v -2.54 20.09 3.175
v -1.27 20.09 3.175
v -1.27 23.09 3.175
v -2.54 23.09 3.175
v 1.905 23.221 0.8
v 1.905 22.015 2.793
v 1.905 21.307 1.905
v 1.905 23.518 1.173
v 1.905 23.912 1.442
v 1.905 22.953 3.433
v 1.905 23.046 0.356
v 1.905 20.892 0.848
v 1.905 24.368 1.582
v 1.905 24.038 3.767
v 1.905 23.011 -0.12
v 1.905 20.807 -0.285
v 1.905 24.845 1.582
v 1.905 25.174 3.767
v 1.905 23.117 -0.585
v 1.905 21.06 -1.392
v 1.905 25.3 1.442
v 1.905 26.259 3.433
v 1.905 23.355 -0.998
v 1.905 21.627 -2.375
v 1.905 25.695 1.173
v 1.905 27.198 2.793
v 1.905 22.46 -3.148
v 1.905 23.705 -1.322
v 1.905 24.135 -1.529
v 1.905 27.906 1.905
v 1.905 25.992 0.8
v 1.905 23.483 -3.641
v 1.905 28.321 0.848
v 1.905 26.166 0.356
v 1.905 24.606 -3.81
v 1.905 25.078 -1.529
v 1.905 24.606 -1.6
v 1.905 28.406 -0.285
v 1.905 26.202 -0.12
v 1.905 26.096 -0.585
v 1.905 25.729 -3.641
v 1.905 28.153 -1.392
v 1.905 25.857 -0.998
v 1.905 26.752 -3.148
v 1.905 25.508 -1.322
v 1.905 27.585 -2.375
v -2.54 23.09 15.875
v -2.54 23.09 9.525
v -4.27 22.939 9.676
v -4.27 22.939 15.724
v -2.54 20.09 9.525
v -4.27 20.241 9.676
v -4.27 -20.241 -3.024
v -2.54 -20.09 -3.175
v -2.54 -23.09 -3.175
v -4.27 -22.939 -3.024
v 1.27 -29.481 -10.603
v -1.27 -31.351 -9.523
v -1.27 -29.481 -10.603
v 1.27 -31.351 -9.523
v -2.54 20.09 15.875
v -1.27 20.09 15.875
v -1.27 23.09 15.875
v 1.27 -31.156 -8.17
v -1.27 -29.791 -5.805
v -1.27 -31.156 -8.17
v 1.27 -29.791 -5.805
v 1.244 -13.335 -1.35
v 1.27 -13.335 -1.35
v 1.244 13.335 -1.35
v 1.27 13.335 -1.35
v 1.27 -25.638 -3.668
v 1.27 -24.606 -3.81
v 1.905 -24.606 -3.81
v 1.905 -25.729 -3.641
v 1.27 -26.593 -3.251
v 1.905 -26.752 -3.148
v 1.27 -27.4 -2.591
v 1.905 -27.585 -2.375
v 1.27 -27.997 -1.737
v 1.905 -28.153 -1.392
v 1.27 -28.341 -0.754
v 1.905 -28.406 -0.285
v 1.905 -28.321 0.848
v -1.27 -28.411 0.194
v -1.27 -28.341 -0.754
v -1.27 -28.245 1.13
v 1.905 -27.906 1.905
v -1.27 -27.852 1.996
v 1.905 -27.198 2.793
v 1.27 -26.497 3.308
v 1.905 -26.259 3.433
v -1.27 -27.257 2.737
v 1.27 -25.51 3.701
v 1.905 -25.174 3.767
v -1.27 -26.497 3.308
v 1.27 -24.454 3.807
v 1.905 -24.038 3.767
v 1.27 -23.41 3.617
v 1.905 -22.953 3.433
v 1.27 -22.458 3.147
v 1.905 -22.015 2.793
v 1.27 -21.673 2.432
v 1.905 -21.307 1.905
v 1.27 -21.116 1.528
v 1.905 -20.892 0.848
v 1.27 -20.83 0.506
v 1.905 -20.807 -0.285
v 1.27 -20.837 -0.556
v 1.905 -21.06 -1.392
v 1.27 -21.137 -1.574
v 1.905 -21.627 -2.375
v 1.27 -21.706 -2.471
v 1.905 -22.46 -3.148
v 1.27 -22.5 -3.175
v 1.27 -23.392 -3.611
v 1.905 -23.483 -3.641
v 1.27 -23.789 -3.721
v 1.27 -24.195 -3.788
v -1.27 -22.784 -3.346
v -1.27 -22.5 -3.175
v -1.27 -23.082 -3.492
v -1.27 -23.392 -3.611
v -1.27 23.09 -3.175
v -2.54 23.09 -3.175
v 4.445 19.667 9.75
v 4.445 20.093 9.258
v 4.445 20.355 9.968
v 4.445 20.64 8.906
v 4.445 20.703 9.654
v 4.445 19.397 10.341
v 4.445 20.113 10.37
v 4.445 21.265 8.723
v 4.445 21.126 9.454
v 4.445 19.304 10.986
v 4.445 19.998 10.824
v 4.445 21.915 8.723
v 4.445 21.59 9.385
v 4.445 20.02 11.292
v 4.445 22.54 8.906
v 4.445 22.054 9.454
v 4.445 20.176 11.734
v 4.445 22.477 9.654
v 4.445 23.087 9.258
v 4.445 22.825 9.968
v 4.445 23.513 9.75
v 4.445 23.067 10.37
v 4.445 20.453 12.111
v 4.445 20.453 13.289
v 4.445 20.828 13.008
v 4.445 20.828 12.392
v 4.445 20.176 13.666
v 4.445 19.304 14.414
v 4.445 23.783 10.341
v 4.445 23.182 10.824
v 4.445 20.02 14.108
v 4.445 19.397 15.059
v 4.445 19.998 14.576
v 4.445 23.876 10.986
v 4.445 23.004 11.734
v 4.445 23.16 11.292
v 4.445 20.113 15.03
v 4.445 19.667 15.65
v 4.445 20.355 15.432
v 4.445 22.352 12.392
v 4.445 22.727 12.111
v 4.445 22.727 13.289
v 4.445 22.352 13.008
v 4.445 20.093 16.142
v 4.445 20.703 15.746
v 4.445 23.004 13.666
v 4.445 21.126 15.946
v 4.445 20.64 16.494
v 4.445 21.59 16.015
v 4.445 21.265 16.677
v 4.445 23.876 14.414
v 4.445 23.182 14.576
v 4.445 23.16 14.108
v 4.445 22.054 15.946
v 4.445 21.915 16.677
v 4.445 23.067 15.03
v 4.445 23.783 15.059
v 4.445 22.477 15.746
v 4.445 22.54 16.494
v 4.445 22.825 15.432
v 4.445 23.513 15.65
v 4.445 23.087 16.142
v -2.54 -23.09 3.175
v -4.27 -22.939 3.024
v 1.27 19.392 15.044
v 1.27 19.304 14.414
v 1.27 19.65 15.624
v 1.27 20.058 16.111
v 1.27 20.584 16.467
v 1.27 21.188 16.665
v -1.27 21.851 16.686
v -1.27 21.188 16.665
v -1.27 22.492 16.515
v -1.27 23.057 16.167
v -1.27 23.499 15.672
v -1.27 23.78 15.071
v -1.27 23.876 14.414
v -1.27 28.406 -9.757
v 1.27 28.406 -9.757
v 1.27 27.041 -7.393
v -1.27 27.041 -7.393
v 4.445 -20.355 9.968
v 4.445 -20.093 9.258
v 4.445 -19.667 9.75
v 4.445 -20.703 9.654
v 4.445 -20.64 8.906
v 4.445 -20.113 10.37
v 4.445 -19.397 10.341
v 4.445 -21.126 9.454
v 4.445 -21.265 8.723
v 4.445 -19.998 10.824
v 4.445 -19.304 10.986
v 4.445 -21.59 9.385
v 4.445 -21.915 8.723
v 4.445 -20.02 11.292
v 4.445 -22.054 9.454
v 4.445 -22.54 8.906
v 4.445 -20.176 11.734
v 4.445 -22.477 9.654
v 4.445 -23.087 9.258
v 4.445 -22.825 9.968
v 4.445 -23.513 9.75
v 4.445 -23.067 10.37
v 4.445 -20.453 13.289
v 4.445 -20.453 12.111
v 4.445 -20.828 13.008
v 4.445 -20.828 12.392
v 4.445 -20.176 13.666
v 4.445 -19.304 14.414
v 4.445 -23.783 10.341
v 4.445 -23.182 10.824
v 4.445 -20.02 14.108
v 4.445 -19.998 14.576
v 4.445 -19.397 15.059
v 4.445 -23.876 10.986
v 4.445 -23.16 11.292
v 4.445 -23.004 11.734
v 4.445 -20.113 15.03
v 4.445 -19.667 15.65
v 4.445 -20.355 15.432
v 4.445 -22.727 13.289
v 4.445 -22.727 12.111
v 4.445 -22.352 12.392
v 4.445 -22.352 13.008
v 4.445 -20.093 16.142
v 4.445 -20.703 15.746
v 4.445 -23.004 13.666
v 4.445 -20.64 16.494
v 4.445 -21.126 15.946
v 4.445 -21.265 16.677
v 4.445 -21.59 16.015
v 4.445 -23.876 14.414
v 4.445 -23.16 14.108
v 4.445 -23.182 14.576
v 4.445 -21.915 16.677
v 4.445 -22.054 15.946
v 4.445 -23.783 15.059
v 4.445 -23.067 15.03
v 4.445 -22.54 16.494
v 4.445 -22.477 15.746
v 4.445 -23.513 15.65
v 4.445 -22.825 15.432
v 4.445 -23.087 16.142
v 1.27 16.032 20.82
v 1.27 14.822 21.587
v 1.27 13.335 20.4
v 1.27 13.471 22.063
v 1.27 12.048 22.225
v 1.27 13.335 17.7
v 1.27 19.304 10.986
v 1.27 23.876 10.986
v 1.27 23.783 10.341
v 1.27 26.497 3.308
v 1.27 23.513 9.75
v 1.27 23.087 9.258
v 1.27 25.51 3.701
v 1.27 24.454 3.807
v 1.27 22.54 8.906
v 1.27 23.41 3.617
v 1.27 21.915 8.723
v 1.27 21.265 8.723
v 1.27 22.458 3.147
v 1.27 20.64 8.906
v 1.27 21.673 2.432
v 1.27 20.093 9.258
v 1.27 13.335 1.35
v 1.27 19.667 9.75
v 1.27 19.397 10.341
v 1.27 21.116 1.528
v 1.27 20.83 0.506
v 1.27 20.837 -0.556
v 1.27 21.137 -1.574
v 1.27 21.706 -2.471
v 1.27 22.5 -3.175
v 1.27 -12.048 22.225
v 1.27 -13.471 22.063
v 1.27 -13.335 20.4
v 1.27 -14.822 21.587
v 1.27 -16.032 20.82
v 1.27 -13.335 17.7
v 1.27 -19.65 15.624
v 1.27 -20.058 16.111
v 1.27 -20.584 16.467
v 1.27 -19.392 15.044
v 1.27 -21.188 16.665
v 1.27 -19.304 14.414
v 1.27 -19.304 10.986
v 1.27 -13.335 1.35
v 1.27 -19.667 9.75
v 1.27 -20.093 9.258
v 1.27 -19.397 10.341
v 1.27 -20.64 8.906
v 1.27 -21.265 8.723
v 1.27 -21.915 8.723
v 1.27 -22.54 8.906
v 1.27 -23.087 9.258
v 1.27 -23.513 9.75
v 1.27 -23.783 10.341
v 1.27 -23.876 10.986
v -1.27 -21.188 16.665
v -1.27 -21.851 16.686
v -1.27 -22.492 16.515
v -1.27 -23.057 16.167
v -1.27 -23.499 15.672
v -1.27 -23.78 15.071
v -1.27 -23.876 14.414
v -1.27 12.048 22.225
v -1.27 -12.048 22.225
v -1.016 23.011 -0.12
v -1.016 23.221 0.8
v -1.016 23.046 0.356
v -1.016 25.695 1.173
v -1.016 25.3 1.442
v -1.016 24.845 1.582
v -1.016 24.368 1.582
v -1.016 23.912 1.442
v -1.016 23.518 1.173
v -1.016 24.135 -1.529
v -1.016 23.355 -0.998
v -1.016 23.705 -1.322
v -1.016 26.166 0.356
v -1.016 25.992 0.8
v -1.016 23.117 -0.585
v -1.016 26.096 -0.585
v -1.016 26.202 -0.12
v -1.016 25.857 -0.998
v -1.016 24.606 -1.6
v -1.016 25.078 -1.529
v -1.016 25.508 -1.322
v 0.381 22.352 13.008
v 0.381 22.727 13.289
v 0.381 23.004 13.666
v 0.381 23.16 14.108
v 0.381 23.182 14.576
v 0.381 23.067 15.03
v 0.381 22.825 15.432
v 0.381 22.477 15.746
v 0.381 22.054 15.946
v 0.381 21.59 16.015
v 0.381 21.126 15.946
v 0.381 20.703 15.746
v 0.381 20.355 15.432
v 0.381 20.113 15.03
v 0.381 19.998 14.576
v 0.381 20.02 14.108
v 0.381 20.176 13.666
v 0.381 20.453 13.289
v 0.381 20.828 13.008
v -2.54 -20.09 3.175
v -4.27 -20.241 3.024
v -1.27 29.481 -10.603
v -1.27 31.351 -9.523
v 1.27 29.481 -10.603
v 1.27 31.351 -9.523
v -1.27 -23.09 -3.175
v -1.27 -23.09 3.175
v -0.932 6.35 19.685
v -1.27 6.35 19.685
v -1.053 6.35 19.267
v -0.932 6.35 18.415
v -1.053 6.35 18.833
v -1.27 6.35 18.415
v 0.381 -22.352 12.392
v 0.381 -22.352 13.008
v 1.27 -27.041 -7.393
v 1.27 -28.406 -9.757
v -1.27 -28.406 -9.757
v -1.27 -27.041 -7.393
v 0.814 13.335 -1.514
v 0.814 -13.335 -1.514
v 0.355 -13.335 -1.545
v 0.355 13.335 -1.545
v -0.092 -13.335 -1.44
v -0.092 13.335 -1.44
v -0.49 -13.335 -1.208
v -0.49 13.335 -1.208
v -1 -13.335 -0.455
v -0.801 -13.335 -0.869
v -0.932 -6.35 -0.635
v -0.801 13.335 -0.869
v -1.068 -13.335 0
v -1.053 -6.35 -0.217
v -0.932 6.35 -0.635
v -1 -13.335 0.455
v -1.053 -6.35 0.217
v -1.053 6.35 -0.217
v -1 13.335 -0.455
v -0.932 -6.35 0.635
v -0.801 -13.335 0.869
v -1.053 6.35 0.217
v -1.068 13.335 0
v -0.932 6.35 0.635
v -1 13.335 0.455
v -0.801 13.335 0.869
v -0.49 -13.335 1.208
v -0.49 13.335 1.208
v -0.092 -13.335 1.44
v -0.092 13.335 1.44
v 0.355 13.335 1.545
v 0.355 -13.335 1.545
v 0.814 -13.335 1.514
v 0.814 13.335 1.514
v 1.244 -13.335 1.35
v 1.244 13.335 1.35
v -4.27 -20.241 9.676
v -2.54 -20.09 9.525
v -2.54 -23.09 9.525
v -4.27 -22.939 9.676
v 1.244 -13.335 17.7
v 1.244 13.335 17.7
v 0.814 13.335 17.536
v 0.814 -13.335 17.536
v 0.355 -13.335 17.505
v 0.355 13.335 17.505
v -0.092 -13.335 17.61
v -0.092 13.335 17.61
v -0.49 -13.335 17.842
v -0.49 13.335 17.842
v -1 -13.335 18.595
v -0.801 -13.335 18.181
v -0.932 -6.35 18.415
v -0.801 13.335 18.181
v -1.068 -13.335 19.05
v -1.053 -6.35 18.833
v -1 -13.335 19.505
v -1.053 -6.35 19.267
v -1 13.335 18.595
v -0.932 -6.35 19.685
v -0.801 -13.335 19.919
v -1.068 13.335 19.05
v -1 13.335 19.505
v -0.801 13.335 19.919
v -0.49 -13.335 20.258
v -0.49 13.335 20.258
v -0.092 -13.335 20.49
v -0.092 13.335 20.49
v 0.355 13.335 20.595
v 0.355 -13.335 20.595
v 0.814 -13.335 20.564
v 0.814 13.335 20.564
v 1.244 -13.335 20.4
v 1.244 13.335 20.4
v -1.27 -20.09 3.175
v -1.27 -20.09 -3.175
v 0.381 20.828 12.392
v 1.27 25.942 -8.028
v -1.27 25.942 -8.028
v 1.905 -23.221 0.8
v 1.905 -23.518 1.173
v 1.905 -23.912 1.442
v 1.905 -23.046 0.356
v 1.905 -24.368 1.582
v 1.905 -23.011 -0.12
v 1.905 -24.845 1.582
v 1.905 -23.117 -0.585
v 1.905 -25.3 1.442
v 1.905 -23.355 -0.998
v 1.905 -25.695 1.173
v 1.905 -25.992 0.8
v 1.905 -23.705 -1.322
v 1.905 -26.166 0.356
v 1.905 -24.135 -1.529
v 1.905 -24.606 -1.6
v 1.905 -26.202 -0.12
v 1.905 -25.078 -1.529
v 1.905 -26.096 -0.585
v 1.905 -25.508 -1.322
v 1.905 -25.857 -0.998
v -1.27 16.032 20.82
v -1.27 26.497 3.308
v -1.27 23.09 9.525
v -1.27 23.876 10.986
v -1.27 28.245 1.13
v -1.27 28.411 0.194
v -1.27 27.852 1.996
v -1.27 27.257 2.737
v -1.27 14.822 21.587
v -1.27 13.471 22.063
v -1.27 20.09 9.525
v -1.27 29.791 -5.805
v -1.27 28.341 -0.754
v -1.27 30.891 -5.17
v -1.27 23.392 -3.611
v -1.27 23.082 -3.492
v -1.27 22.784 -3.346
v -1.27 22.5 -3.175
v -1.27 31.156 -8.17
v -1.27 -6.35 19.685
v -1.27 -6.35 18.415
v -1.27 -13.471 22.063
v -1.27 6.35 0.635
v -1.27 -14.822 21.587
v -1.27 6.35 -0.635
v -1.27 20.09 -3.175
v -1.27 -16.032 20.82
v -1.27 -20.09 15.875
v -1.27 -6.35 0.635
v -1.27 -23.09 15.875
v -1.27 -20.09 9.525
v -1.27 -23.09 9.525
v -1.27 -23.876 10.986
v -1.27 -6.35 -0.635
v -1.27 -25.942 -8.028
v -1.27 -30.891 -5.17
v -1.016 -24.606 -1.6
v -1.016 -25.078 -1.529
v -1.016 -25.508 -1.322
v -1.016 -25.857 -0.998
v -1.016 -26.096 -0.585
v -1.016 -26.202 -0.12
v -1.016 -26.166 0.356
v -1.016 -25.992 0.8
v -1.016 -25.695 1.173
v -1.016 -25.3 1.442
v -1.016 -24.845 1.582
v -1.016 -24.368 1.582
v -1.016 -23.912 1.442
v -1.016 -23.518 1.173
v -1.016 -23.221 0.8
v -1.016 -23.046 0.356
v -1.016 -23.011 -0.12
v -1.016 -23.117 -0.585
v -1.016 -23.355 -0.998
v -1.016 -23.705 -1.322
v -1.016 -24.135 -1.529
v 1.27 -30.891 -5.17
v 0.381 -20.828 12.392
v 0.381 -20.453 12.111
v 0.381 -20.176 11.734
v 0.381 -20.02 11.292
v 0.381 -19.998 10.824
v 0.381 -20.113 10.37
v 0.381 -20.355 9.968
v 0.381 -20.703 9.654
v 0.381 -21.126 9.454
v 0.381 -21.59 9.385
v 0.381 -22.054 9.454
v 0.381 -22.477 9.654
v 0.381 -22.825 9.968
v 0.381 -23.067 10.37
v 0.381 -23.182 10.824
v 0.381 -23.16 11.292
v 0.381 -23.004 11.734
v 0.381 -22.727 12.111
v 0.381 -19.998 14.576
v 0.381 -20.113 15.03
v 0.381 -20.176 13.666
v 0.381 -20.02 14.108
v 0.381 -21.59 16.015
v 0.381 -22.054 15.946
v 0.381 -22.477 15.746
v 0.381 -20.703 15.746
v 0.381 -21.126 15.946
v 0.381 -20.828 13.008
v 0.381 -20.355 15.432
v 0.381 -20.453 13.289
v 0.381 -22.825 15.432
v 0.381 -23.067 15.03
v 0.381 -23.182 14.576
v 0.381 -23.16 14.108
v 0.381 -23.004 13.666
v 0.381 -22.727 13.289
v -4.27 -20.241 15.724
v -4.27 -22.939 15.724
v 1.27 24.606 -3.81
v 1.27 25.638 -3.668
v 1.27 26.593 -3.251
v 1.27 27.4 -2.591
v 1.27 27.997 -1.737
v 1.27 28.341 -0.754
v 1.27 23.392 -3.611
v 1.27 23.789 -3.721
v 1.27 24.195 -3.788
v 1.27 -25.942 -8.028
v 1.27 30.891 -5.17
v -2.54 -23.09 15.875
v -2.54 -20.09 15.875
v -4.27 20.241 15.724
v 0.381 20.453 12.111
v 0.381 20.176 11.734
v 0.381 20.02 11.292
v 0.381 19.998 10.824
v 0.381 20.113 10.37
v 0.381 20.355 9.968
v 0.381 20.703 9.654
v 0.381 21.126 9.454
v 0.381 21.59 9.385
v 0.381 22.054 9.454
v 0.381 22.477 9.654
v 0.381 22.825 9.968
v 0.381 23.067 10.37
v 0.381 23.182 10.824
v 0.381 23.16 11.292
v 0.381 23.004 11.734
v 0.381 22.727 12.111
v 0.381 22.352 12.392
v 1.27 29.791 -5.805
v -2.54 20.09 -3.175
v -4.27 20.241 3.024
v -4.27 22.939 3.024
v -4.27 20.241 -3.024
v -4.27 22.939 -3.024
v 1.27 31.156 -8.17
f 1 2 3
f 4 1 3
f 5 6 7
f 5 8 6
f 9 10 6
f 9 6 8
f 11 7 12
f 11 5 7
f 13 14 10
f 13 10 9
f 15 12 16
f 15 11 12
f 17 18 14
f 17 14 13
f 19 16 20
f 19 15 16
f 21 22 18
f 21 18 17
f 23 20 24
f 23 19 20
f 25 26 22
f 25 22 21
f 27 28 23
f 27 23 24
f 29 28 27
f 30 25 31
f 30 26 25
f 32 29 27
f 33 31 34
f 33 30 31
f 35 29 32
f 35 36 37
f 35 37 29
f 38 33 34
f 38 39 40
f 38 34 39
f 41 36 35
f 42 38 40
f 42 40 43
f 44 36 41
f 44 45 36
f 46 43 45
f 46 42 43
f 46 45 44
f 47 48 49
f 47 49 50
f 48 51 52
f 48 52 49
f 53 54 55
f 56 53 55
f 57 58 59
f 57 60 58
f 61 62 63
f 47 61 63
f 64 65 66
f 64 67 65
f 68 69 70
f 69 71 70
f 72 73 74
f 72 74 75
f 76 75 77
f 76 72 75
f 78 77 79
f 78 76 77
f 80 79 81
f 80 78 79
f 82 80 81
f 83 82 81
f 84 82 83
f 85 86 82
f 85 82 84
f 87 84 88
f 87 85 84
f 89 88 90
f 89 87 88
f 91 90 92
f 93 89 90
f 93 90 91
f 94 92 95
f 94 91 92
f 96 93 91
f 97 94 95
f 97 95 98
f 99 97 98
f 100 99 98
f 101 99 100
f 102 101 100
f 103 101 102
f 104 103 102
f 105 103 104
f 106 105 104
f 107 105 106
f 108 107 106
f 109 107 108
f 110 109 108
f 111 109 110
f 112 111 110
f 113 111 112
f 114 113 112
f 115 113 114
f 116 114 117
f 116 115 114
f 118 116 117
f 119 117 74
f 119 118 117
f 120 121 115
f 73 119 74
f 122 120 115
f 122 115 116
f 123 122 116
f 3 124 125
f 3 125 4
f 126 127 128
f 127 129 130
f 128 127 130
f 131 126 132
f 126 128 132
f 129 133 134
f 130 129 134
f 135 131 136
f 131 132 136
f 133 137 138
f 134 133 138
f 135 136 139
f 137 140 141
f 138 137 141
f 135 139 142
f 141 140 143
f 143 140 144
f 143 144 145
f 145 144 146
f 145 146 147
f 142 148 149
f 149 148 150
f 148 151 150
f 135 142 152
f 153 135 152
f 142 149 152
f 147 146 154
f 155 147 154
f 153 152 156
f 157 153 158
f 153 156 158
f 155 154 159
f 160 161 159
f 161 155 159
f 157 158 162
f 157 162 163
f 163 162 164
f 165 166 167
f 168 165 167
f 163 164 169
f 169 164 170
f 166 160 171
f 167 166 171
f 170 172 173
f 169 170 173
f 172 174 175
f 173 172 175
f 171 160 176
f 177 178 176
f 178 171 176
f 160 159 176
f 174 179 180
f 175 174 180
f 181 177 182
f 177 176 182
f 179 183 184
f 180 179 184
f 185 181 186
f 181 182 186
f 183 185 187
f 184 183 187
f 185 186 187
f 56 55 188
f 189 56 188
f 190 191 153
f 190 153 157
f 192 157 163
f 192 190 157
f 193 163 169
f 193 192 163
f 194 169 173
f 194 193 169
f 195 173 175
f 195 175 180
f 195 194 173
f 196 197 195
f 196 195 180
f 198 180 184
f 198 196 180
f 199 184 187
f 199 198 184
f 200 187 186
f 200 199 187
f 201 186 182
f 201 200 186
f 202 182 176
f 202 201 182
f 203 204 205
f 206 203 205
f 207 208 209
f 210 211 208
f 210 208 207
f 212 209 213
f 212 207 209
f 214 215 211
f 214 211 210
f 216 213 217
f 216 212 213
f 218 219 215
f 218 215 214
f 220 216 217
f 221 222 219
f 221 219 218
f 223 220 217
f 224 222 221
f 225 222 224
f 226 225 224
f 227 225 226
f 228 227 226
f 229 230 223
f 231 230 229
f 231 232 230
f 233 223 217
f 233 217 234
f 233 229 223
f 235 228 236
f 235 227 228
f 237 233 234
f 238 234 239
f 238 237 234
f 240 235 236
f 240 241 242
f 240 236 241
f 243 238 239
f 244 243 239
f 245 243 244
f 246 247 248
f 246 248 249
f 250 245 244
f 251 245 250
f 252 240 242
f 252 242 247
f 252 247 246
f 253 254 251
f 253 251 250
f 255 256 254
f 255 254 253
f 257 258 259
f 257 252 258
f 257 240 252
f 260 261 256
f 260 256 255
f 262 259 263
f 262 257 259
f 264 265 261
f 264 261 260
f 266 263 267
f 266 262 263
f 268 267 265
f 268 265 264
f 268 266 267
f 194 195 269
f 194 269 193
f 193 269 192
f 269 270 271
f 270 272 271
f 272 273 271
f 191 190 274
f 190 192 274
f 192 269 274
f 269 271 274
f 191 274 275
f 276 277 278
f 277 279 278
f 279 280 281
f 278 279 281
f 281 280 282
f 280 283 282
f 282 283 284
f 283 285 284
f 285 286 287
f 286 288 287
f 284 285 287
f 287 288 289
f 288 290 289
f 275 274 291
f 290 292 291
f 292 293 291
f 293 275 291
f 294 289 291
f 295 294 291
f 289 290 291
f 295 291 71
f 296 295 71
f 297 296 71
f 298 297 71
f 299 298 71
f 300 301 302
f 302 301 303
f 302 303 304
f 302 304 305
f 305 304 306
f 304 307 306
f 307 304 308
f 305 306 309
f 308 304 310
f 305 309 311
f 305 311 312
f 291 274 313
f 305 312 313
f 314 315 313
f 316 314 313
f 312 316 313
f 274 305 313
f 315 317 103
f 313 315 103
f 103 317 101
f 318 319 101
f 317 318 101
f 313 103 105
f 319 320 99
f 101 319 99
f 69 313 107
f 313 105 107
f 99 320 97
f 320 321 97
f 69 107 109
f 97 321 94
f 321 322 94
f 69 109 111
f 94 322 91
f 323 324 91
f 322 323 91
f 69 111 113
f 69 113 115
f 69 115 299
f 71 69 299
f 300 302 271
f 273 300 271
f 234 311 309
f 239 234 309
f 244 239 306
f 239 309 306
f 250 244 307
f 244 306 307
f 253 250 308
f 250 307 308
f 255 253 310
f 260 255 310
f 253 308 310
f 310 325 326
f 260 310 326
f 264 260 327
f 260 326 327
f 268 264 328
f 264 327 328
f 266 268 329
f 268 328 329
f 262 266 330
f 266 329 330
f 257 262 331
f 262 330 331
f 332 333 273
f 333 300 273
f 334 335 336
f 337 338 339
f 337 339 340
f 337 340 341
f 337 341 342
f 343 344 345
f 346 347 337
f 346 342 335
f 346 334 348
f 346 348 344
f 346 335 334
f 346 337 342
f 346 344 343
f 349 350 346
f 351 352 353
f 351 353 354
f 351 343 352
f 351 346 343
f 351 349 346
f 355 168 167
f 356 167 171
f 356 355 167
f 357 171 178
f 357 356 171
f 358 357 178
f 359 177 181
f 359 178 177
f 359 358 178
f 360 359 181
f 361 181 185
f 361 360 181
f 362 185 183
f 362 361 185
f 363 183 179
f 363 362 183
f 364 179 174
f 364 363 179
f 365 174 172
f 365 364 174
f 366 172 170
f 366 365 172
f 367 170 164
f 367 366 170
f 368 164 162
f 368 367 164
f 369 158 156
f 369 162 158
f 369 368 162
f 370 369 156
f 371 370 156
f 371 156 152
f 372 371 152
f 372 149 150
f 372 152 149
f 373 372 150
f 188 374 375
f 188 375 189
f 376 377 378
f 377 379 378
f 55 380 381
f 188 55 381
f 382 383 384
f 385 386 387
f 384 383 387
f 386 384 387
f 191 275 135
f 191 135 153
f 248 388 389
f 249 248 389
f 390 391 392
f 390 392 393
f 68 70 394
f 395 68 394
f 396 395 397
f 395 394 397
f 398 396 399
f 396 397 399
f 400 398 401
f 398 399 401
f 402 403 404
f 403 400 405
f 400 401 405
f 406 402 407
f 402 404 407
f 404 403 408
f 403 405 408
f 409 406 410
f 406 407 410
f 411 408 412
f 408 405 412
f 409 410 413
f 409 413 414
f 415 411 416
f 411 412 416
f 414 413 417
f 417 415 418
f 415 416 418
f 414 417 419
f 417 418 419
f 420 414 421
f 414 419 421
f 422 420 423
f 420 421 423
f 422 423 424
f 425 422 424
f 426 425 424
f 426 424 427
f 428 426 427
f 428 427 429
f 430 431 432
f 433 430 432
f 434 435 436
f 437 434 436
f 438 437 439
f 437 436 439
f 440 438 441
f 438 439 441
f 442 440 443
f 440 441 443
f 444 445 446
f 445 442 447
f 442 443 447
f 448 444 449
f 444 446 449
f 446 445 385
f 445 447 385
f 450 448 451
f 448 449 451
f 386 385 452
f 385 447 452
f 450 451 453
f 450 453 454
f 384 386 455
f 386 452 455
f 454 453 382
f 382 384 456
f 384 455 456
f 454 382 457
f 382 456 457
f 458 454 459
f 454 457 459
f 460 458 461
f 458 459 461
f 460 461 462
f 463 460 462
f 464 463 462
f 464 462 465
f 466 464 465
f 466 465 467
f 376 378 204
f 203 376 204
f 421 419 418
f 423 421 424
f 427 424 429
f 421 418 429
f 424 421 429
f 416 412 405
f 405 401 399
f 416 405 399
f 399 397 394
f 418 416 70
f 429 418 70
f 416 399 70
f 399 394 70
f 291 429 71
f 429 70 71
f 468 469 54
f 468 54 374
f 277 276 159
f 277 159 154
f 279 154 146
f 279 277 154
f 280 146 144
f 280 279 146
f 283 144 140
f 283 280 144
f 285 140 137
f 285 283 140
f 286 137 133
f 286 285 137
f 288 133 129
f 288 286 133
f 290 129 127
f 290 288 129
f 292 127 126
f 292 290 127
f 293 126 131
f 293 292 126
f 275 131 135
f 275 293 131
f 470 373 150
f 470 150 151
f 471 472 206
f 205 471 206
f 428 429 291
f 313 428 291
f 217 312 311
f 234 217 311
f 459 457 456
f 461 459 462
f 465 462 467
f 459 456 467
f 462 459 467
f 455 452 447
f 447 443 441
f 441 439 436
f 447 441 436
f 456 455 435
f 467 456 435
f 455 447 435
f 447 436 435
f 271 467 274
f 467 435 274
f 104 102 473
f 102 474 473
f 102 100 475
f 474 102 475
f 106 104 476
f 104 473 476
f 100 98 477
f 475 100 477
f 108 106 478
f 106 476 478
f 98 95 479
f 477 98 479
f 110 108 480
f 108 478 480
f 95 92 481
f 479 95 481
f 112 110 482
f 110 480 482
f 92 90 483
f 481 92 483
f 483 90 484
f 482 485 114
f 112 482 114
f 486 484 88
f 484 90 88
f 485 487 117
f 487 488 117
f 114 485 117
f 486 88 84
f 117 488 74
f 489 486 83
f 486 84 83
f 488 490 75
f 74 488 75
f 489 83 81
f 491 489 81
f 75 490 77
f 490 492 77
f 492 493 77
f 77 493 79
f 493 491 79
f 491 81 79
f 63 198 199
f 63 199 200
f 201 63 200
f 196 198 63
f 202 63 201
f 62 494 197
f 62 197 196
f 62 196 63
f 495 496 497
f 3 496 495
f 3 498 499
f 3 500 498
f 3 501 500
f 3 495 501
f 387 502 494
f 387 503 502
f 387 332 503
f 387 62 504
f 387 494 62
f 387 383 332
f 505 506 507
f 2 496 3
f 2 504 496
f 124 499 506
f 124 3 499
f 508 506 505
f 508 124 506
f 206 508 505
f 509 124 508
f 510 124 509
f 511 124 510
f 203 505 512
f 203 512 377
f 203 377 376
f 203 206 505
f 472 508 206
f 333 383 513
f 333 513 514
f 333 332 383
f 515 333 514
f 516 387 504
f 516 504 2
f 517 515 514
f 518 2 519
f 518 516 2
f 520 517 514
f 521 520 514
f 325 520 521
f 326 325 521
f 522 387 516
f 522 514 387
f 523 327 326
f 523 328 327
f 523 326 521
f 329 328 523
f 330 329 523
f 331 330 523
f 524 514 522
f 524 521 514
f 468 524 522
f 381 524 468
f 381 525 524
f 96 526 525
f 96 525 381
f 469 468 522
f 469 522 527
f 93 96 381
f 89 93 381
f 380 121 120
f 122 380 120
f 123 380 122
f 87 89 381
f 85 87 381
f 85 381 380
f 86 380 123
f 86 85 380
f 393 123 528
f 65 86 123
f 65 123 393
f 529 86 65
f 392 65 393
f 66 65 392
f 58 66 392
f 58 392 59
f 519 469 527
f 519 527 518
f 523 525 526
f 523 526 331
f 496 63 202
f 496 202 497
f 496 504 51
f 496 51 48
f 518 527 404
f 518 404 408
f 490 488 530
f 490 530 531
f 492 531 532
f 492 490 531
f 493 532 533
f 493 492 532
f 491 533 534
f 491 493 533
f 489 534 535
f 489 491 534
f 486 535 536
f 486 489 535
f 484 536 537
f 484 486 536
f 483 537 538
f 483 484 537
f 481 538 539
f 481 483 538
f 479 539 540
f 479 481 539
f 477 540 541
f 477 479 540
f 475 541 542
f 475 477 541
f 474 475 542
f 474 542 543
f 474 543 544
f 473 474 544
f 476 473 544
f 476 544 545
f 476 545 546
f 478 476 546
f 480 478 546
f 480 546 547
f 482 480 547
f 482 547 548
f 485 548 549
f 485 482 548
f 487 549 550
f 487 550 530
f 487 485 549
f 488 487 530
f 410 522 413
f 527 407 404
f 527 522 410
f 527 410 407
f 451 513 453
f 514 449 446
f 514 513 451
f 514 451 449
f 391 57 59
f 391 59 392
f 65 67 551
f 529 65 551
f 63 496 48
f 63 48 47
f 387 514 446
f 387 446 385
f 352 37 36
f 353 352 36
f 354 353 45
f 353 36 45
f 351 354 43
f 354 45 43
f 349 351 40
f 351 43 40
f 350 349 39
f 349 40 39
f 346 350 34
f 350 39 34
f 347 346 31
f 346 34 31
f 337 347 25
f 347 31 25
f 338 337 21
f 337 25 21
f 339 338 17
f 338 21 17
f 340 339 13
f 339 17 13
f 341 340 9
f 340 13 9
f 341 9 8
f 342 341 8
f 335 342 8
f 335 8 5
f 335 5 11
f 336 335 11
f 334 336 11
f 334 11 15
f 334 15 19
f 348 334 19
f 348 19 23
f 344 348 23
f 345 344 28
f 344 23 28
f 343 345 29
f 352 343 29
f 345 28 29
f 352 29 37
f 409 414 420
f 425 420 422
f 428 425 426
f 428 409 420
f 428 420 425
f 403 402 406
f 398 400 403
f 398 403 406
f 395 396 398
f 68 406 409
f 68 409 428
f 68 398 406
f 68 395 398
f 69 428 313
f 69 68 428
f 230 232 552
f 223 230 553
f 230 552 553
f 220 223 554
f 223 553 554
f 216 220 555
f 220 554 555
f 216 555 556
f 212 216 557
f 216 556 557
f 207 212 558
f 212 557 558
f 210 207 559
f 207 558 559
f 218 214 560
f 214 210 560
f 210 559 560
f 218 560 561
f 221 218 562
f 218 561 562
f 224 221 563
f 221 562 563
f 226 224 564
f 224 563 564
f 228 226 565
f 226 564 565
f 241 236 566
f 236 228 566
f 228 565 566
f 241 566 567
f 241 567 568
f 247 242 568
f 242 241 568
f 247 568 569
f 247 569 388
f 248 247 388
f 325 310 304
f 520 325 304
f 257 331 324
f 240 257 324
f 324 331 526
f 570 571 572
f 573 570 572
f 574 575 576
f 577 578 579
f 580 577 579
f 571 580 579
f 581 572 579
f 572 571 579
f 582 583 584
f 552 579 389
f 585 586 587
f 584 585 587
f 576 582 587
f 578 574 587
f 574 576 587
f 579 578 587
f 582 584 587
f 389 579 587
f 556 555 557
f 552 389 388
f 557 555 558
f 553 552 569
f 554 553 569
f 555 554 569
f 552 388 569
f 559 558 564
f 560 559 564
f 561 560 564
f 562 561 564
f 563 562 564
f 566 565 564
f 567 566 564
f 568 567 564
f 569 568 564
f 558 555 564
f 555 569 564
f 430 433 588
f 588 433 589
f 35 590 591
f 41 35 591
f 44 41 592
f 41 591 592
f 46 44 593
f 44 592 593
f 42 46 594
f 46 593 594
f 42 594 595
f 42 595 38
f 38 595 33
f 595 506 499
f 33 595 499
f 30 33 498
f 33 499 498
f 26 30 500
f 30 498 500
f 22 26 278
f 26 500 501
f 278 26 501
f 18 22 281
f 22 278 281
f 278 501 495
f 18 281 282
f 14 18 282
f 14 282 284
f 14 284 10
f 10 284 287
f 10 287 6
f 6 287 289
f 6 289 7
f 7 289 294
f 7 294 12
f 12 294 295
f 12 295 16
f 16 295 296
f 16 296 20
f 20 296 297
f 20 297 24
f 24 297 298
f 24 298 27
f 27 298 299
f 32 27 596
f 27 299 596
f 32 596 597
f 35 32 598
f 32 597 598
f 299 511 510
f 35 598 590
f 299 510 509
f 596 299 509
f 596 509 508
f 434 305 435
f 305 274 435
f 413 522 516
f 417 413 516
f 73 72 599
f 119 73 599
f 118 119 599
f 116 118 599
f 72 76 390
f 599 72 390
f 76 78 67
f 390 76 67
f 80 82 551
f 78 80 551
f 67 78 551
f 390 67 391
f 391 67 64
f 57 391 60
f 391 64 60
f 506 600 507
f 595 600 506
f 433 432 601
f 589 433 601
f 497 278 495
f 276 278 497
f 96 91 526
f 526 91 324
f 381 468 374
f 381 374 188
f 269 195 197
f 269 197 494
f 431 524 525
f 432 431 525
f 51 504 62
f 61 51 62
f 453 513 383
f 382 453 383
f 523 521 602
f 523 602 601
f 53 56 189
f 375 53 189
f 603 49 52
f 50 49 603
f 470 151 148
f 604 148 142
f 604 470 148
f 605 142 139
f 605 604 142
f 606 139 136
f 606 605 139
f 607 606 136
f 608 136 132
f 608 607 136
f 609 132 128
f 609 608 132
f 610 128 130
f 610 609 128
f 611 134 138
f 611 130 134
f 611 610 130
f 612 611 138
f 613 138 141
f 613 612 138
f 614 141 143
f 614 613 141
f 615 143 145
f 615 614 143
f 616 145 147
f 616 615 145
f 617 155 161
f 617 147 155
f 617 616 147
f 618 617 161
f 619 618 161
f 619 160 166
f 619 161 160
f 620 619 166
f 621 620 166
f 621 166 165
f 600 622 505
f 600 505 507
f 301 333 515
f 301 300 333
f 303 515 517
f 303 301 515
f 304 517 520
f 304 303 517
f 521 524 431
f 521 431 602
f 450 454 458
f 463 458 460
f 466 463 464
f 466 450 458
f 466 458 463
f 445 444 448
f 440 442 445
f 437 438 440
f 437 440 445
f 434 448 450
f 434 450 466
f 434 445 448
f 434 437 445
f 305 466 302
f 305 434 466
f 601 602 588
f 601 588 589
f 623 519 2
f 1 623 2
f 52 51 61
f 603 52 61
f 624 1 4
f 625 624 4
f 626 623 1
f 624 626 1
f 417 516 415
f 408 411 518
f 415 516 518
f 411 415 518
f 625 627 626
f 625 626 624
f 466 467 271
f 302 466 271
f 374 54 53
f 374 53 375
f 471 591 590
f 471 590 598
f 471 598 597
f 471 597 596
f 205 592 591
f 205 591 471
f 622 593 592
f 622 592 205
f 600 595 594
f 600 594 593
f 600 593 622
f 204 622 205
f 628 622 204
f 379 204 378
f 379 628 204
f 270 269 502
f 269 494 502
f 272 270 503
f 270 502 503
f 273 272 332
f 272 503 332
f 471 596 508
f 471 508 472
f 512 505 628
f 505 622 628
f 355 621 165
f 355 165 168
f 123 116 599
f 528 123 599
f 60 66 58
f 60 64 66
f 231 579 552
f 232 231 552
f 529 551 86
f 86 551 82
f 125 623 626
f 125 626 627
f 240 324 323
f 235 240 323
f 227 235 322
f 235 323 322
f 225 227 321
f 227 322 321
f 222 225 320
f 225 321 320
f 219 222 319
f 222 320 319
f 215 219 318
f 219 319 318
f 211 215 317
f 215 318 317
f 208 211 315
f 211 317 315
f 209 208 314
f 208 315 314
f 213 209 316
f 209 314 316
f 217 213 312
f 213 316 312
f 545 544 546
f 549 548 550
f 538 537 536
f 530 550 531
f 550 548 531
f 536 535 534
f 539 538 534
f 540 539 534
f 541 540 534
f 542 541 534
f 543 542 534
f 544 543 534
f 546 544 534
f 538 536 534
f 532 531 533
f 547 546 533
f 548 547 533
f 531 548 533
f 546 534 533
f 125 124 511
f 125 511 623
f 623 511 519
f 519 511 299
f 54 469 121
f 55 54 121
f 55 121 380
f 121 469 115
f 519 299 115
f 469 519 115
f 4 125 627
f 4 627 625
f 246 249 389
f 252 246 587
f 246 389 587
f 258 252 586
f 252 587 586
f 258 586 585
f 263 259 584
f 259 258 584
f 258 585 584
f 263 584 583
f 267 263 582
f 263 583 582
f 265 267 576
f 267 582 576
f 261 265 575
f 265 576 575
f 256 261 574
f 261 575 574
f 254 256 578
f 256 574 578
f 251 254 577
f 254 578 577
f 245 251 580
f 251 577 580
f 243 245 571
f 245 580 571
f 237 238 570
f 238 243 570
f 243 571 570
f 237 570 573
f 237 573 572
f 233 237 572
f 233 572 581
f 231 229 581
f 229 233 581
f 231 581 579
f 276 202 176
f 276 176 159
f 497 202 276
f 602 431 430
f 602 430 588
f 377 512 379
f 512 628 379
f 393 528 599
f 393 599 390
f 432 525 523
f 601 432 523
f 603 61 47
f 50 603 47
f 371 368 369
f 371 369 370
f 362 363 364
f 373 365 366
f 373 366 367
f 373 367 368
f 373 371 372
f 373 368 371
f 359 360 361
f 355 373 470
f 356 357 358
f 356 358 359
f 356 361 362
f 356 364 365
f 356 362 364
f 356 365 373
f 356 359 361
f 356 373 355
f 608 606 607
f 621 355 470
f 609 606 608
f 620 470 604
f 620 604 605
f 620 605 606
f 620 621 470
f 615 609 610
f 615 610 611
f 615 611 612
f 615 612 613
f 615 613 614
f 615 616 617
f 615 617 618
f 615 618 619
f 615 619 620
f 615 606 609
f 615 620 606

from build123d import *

# Parameters (mm, degrees)
DOWELSUPPORT_DEPTH          = 1.905
DOWELSUPPORT_DEPTH_BACK     = 1.27
SKETCH3_R                   = 3.81
SKETCH5_W                   = 6.35
SKETCH5_H                   = 28.575
SLIDERDOWELSUPPORT_DEPTH    = 1.27
SLIDERDOWELCUTOUT_DEPTH     = 13.335
CUT_EXTRUDE2_DEPTH          = 29.782824115
CUT_EXTRUDE2_DEPTH_BACK     = 29.782824115
SKETCH20_W                  = 1.27
SKETCH20_H                  = 12.7
LPATTERN1_COUNT             = 2
LPATTERN1_PITCH             = 19.05
LATERALSUPPORT_DEPTH        = 1.27
SKETCH8_W                   = 6.35
SKETCH8_H                   = 3
TABSUPPORT_DEPTH            = 1.27
STRINGDOWELSUPPORT_START    = -1.27
STRINGDOWELSUPPORT_DEPTH    = 5.715
INTERSUPPORT_DEPTH          = 1.27
SKETCH10_W                  = 6.35
SKETCH10_H                  = 3
TABBASE_DEPTH               = 1.27
SKETCH12_W                  = 6.35
SKETCH12_H                  = 3
TABDRAFT_DEPTH              = 1.73
TABDRAFT_DRAFT              = 5
TABDRAFT_PROFILE_2_DEPTH    = 1.73
TABDRAFT_PROFILE_2_DRAFT    = 5
STRINGDOWELHOLES_DEPTH      = 39.922670163
STRINGDOWELHOLES_DEPTH_BACK = 1.524
SKETCH14_R                  = 1.600000102
PULLEYDOWELHOLE_DEPTH       = 2.921
FILLET1_R                   = 6.35


with BuildPart() as part:
    # Sketch3 → DowelSupport (new, two sides: drawn at the far end of the back side and taken through both)
    with BuildSketch(Plane(origin=(0, 0, 0), x_dir=(0, 0, -1), z_dir=(1, 0, 0)).offset(-DOWELSUPPORT_DEPTH_BACK)):
        with Locations((0, 24.60625)):
            Circle(SKETCH3_R)
    extrude(amount=DOWELSUPPORT_DEPTH + DOWELSUPPORT_DEPTH_BACK)

    # Sketch8 → TabSupport (add, symmetric)
    with BuildSketch(Plane(origin=(0, 0, 0), x_dir=(0, 0, -1), z_dir=(1, 0, 0))):
        with Locations((0, 21.59)):
            Rectangle(SKETCH8_W, SKETCH8_H)
        with Locations((-12.7, 21.59)):
            Rectangle(SKETCH8_W, SKETCH8_H)
    extrude(amount=TABSUPPORT_DEPTH, both=True)


with BuildPart() as body_2:
    # Sketch5 → SliderDowelSupport (new, symmetric)
    with BuildSketch(Plane(origin=(0, 0, 0), x_dir=(0, 0, -1), z_dir=(1, 0, 0))):
        Rectangle(SKETCH5_W, SKETCH5_H)
    extrude(amount=SLIDERDOWELSUPPORT_DEPTH, both=True)

    # Sketch19 → SliderDowelCutout (cut, symmetric)
    with BuildSketch(Plane(origin=(0, 0, 0), x_dir=(1, 0, 0), z_dir=(0, 1, 0))):
        with BuildLine():
            Line((1.27, 1.350000094), (1.243577144, 1.350000094))
            ThreePointArc((1.243577144, 1.350000094), (-1.068, 0), (1.243577144, -1.350000094))
            Line((1.243577144, -1.350000094), (1.27, -1.350000094))
            Line((1.27, -1.350000094), (1.27, 1.350000094))
        make_face()
    extrude(amount=SLIDERDOWELCUTOUT_DEPTH, both=True, mode=Mode.SUBTRACT)

    # Sketch20 → Cut-Extrude2 (cut, two sides: drawn at the far end of the back side and taken through both)
    with BuildSketch(Plane(origin=(1.27, 0, 0), x_dir=(0, 0, -1), z_dir=(1, 0, 0)).offset(-CUT_EXTRUDE2_DEPTH_BACK)):
        Rectangle(SKETCH20_W, SKETCH20_H)
    extrude(amount=CUT_EXTRUDE2_DEPTH + CUT_EXTRUDE2_DEPTH_BACK, mode=Mode.SUBTRACT)


with BuildPart() as lpattern1_1:
    # LPattern1: pattern copy
    add(body_2.part.moved(Location(Vector(0, 0, 1) * (1 * LPATTERN1_PITCH))))


with BuildPart() as body_4:
    # Sketch6 → LateralSupport (new, symmetric)
    with BuildSketch(Plane(origin=(0, 0, 0), x_dir=(0, 0, -1), z_dir=(1, 0, 0))):
        Polygon((7.392863577, 27.041434671), (5.805363577, 29.791065329), (8.169612929, 31.156065329), (9.523465192, 31.351124423), (10.602965192, 29.481375577), (9.757112929, 28.406434671), align=None)
    extrude(amount=LATERALSUPPORT_DEPTH, both=True)


with BuildPart() as tabsupport_piece_1:
    # of the separate pieces the step leaves, piece 1, a body of its own (tabsupport_pieces)
    add(part.part.solids().sort_by_distance((0, 24.60625, -3.81))[0])


with BuildPart() as tabsupport_piece_2:
    # of the separate pieces the step leaves, piece 2, a body of its own (tabsupport_pieces)
    add(part.part.solids().sort_by_distance((-1.27, 20.09, 9.525))[0])

    # Sketch15 → StringDowelSupport (add)
    with BuildSketch(Plane(origin=(0, 0, 0), x_dir=(0, 0, -1), z_dir=(1, 0, 0)).offset(STRINGDOWELSUPPORT_START)):
        with BuildLine():
            Line((-14.4145, 23.876), (-10.9855, 23.876))
            ThreePointArc((-10.9855, 23.876), (-8.6995, 21.59), (-10.9855, 19.304))
            Line((-10.9855, 19.304), (-14.4145, 19.304))
            ThreePointArc((-14.4145, 19.304), (-16.7005, 21.59), (-14.4145, 23.876))
        make_face()
    extrude(amount=STRINGDOWELSUPPORT_DEPTH)


with BuildPart() as body_2_1:
    add(body_2.part)

    add(lpattern1_1.part)  # InterSupport merges LPattern1_1

    add(body_4.part)  # InterSupport merges body 4

    add(tabsupport_piece_1.part)  # InterSupport merges TabSupport piece 1

    add(tabsupport_piece_2.part)  # InterSupport merges TabSupport piece 2
    # Sketch7 → InterSupport (add, symmetric)
    with BuildSketch(Plane(origin=(0, 0, 0), x_dir=(0, 0, -1), z_dir=(1, 0, 0))):
        Polygon((8.027863577, 25.941582409), (5.170363577, 30.890917591), (-1.187110053, 27.22042848), (-0.923046602, 27.310559749), (0, 24.60625), (1.42875, 22.131582409), align=None)
        Polygon((-1.42875, 27.080917591), (-1.187110053, 27.22042848), (-10.9855, 23.876), (-14.4145, 23.876), (-15.582507886, 22.531146949), (-22.225, 14.2875), (-15.875, 14.2875), (-15.875, 0), (-3.175, 0), (-3.175, 14.2875), (3.175, 14.2875), (3.175, 20.09), (0.923046602, 21.901940251), (0, 24.60625), align=None)
    extrude(amount=INTERSUPPORT_DEPTH, both=True)

    # Sketch10 → TabBase (add)
    with BuildSketch(Plane.ZY.offset(1.27)):
        with Locations((0, 21.59)):
            Rectangle(SKETCH10_W, SKETCH10_H)
        with Locations((12.7, 21.59)):
            Rectangle(SKETCH10_W, SKETCH10_H)
    extrude(amount=TABBASE_DEPTH)


with BuildPart() as tabdraft_tool:
    # Sketch12 → TabDraft (with draft: the straight prism first)
    with BuildSketch(Plane.ZY.offset(2.54)):
        with Locations((0, 21.59)):
            Rectangle(SKETCH12_W, SKETCH12_H)
    extrude(amount=TABDRAFT_DEPTH)
    # TabDraft: the draft: its side faces are tilted about the plane it starts from
    tabdraft_sides = [tabdraft_tool.faces().sort_by_distance(p)[0] for p in [
        (-3.405, 21.59, 3.175),
        (-3.405, 23.09, 0),
        (-3.405, 21.59, -3.175),
        (-3.405, 20.09, 0),
    ]]
    draft(tabdraft_sides, Plane.ZY.offset(2.54), TABDRAFT_DRAFT)


with BuildPart() as body_2_2:
    add(body_2_1.part)

    # TabDraft: add tabdraft_tool
    add(tabdraft_tool.part)


with BuildPart() as tabdraft_profile_2_tool:
    # Sketch12 → TabDraft profile 2 (with draft: the straight prism first)
    with BuildSketch(Plane.ZY.offset(2.54)):
        with Locations((12.7, 21.59)):
            Rectangle(SKETCH12_W, SKETCH12_H)
    extrude(amount=TABDRAFT_PROFILE_2_DEPTH)
    # TabDraft profile 2: the draft: its side faces are tilted about the plane it starts from
    tabdraft_profile_2_sides = [tabdraft_profile_2_tool.faces().sort_by_distance(p)[0] for p in [
        (-3.405, 21.59, 9.525),
        (-3.405, 20.09, 12.7),
        (-3.405, 21.59, 15.875),
        (-3.405, 23.09, 12.7),
    ]]
    draft(tabdraft_profile_2_sides, Plane.ZY.offset(2.54), TABDRAFT_PROFILE_2_DRAFT)


with BuildPart() as body_2_3:
    add(body_2_2.part)

    # TabDraft profile 2: add tabdraft_profile_2_tool
    add(tabdraft_profile_2_tool.part)

    # Sketch16 → StringDowelHoles (cut, two sides: drawn at the far end of the back side and taken through both)
    with BuildSketch(Plane(origin=(1.905, 0, 0), x_dir=(0, 0, -1), z_dir=(1, 0, 0)).offset(-STRINGDOWELHOLES_DEPTH_BACK)):
        with BuildLine():
            Line((-13.00760401, 20.828), (-12.39239599, 20.828))
            ThreePointArc((-12.39239599, 20.828), (-9.385499898, 21.59), (-12.39239599, 22.352))
            Line((-12.39239599, 22.352), (-13.00760401, 22.352))
            ThreePointArc((-13.00760401, 22.352), (-16.014500102, 21.59), (-13.00760401, 20.828))
        make_face()
    extrude(amount=STRINGDOWELHOLES_DEPTH + STRINGDOWELHOLES_DEPTH_BACK, mode=Mode.SUBTRACT)

    # Sketch14 → PulleyDowelHole (cut)
    with BuildSketch(Plane(origin=(1.905, 0, 0), x_dir=(0, 0, -1), z_dir=(1, 0, 0))):
        with Locations((0, 24.60625)):
            Circle(SKETCH14_R)
    extrude(amount=-PULLEYDOWELHOLE_DEPTH, mode=Mode.SUBTRACT)

    # Mirror1: body 2 across plane


with BuildPart() as body_2_4:
    add(body_2_3.part)
    add(body_2_3.part.mirror(Plane.ZX))

    # Fillet1
    fillet1_edges = [body_2_4.edges().sort_by_distance(p)[0] for p in [
        (0, -14.2875, 22.225),
        (0, 14.2875, 22.225),
    ]]
    fillet(fillet1_edges, radius=FILLET1_R)


solid = body_2_4.part
